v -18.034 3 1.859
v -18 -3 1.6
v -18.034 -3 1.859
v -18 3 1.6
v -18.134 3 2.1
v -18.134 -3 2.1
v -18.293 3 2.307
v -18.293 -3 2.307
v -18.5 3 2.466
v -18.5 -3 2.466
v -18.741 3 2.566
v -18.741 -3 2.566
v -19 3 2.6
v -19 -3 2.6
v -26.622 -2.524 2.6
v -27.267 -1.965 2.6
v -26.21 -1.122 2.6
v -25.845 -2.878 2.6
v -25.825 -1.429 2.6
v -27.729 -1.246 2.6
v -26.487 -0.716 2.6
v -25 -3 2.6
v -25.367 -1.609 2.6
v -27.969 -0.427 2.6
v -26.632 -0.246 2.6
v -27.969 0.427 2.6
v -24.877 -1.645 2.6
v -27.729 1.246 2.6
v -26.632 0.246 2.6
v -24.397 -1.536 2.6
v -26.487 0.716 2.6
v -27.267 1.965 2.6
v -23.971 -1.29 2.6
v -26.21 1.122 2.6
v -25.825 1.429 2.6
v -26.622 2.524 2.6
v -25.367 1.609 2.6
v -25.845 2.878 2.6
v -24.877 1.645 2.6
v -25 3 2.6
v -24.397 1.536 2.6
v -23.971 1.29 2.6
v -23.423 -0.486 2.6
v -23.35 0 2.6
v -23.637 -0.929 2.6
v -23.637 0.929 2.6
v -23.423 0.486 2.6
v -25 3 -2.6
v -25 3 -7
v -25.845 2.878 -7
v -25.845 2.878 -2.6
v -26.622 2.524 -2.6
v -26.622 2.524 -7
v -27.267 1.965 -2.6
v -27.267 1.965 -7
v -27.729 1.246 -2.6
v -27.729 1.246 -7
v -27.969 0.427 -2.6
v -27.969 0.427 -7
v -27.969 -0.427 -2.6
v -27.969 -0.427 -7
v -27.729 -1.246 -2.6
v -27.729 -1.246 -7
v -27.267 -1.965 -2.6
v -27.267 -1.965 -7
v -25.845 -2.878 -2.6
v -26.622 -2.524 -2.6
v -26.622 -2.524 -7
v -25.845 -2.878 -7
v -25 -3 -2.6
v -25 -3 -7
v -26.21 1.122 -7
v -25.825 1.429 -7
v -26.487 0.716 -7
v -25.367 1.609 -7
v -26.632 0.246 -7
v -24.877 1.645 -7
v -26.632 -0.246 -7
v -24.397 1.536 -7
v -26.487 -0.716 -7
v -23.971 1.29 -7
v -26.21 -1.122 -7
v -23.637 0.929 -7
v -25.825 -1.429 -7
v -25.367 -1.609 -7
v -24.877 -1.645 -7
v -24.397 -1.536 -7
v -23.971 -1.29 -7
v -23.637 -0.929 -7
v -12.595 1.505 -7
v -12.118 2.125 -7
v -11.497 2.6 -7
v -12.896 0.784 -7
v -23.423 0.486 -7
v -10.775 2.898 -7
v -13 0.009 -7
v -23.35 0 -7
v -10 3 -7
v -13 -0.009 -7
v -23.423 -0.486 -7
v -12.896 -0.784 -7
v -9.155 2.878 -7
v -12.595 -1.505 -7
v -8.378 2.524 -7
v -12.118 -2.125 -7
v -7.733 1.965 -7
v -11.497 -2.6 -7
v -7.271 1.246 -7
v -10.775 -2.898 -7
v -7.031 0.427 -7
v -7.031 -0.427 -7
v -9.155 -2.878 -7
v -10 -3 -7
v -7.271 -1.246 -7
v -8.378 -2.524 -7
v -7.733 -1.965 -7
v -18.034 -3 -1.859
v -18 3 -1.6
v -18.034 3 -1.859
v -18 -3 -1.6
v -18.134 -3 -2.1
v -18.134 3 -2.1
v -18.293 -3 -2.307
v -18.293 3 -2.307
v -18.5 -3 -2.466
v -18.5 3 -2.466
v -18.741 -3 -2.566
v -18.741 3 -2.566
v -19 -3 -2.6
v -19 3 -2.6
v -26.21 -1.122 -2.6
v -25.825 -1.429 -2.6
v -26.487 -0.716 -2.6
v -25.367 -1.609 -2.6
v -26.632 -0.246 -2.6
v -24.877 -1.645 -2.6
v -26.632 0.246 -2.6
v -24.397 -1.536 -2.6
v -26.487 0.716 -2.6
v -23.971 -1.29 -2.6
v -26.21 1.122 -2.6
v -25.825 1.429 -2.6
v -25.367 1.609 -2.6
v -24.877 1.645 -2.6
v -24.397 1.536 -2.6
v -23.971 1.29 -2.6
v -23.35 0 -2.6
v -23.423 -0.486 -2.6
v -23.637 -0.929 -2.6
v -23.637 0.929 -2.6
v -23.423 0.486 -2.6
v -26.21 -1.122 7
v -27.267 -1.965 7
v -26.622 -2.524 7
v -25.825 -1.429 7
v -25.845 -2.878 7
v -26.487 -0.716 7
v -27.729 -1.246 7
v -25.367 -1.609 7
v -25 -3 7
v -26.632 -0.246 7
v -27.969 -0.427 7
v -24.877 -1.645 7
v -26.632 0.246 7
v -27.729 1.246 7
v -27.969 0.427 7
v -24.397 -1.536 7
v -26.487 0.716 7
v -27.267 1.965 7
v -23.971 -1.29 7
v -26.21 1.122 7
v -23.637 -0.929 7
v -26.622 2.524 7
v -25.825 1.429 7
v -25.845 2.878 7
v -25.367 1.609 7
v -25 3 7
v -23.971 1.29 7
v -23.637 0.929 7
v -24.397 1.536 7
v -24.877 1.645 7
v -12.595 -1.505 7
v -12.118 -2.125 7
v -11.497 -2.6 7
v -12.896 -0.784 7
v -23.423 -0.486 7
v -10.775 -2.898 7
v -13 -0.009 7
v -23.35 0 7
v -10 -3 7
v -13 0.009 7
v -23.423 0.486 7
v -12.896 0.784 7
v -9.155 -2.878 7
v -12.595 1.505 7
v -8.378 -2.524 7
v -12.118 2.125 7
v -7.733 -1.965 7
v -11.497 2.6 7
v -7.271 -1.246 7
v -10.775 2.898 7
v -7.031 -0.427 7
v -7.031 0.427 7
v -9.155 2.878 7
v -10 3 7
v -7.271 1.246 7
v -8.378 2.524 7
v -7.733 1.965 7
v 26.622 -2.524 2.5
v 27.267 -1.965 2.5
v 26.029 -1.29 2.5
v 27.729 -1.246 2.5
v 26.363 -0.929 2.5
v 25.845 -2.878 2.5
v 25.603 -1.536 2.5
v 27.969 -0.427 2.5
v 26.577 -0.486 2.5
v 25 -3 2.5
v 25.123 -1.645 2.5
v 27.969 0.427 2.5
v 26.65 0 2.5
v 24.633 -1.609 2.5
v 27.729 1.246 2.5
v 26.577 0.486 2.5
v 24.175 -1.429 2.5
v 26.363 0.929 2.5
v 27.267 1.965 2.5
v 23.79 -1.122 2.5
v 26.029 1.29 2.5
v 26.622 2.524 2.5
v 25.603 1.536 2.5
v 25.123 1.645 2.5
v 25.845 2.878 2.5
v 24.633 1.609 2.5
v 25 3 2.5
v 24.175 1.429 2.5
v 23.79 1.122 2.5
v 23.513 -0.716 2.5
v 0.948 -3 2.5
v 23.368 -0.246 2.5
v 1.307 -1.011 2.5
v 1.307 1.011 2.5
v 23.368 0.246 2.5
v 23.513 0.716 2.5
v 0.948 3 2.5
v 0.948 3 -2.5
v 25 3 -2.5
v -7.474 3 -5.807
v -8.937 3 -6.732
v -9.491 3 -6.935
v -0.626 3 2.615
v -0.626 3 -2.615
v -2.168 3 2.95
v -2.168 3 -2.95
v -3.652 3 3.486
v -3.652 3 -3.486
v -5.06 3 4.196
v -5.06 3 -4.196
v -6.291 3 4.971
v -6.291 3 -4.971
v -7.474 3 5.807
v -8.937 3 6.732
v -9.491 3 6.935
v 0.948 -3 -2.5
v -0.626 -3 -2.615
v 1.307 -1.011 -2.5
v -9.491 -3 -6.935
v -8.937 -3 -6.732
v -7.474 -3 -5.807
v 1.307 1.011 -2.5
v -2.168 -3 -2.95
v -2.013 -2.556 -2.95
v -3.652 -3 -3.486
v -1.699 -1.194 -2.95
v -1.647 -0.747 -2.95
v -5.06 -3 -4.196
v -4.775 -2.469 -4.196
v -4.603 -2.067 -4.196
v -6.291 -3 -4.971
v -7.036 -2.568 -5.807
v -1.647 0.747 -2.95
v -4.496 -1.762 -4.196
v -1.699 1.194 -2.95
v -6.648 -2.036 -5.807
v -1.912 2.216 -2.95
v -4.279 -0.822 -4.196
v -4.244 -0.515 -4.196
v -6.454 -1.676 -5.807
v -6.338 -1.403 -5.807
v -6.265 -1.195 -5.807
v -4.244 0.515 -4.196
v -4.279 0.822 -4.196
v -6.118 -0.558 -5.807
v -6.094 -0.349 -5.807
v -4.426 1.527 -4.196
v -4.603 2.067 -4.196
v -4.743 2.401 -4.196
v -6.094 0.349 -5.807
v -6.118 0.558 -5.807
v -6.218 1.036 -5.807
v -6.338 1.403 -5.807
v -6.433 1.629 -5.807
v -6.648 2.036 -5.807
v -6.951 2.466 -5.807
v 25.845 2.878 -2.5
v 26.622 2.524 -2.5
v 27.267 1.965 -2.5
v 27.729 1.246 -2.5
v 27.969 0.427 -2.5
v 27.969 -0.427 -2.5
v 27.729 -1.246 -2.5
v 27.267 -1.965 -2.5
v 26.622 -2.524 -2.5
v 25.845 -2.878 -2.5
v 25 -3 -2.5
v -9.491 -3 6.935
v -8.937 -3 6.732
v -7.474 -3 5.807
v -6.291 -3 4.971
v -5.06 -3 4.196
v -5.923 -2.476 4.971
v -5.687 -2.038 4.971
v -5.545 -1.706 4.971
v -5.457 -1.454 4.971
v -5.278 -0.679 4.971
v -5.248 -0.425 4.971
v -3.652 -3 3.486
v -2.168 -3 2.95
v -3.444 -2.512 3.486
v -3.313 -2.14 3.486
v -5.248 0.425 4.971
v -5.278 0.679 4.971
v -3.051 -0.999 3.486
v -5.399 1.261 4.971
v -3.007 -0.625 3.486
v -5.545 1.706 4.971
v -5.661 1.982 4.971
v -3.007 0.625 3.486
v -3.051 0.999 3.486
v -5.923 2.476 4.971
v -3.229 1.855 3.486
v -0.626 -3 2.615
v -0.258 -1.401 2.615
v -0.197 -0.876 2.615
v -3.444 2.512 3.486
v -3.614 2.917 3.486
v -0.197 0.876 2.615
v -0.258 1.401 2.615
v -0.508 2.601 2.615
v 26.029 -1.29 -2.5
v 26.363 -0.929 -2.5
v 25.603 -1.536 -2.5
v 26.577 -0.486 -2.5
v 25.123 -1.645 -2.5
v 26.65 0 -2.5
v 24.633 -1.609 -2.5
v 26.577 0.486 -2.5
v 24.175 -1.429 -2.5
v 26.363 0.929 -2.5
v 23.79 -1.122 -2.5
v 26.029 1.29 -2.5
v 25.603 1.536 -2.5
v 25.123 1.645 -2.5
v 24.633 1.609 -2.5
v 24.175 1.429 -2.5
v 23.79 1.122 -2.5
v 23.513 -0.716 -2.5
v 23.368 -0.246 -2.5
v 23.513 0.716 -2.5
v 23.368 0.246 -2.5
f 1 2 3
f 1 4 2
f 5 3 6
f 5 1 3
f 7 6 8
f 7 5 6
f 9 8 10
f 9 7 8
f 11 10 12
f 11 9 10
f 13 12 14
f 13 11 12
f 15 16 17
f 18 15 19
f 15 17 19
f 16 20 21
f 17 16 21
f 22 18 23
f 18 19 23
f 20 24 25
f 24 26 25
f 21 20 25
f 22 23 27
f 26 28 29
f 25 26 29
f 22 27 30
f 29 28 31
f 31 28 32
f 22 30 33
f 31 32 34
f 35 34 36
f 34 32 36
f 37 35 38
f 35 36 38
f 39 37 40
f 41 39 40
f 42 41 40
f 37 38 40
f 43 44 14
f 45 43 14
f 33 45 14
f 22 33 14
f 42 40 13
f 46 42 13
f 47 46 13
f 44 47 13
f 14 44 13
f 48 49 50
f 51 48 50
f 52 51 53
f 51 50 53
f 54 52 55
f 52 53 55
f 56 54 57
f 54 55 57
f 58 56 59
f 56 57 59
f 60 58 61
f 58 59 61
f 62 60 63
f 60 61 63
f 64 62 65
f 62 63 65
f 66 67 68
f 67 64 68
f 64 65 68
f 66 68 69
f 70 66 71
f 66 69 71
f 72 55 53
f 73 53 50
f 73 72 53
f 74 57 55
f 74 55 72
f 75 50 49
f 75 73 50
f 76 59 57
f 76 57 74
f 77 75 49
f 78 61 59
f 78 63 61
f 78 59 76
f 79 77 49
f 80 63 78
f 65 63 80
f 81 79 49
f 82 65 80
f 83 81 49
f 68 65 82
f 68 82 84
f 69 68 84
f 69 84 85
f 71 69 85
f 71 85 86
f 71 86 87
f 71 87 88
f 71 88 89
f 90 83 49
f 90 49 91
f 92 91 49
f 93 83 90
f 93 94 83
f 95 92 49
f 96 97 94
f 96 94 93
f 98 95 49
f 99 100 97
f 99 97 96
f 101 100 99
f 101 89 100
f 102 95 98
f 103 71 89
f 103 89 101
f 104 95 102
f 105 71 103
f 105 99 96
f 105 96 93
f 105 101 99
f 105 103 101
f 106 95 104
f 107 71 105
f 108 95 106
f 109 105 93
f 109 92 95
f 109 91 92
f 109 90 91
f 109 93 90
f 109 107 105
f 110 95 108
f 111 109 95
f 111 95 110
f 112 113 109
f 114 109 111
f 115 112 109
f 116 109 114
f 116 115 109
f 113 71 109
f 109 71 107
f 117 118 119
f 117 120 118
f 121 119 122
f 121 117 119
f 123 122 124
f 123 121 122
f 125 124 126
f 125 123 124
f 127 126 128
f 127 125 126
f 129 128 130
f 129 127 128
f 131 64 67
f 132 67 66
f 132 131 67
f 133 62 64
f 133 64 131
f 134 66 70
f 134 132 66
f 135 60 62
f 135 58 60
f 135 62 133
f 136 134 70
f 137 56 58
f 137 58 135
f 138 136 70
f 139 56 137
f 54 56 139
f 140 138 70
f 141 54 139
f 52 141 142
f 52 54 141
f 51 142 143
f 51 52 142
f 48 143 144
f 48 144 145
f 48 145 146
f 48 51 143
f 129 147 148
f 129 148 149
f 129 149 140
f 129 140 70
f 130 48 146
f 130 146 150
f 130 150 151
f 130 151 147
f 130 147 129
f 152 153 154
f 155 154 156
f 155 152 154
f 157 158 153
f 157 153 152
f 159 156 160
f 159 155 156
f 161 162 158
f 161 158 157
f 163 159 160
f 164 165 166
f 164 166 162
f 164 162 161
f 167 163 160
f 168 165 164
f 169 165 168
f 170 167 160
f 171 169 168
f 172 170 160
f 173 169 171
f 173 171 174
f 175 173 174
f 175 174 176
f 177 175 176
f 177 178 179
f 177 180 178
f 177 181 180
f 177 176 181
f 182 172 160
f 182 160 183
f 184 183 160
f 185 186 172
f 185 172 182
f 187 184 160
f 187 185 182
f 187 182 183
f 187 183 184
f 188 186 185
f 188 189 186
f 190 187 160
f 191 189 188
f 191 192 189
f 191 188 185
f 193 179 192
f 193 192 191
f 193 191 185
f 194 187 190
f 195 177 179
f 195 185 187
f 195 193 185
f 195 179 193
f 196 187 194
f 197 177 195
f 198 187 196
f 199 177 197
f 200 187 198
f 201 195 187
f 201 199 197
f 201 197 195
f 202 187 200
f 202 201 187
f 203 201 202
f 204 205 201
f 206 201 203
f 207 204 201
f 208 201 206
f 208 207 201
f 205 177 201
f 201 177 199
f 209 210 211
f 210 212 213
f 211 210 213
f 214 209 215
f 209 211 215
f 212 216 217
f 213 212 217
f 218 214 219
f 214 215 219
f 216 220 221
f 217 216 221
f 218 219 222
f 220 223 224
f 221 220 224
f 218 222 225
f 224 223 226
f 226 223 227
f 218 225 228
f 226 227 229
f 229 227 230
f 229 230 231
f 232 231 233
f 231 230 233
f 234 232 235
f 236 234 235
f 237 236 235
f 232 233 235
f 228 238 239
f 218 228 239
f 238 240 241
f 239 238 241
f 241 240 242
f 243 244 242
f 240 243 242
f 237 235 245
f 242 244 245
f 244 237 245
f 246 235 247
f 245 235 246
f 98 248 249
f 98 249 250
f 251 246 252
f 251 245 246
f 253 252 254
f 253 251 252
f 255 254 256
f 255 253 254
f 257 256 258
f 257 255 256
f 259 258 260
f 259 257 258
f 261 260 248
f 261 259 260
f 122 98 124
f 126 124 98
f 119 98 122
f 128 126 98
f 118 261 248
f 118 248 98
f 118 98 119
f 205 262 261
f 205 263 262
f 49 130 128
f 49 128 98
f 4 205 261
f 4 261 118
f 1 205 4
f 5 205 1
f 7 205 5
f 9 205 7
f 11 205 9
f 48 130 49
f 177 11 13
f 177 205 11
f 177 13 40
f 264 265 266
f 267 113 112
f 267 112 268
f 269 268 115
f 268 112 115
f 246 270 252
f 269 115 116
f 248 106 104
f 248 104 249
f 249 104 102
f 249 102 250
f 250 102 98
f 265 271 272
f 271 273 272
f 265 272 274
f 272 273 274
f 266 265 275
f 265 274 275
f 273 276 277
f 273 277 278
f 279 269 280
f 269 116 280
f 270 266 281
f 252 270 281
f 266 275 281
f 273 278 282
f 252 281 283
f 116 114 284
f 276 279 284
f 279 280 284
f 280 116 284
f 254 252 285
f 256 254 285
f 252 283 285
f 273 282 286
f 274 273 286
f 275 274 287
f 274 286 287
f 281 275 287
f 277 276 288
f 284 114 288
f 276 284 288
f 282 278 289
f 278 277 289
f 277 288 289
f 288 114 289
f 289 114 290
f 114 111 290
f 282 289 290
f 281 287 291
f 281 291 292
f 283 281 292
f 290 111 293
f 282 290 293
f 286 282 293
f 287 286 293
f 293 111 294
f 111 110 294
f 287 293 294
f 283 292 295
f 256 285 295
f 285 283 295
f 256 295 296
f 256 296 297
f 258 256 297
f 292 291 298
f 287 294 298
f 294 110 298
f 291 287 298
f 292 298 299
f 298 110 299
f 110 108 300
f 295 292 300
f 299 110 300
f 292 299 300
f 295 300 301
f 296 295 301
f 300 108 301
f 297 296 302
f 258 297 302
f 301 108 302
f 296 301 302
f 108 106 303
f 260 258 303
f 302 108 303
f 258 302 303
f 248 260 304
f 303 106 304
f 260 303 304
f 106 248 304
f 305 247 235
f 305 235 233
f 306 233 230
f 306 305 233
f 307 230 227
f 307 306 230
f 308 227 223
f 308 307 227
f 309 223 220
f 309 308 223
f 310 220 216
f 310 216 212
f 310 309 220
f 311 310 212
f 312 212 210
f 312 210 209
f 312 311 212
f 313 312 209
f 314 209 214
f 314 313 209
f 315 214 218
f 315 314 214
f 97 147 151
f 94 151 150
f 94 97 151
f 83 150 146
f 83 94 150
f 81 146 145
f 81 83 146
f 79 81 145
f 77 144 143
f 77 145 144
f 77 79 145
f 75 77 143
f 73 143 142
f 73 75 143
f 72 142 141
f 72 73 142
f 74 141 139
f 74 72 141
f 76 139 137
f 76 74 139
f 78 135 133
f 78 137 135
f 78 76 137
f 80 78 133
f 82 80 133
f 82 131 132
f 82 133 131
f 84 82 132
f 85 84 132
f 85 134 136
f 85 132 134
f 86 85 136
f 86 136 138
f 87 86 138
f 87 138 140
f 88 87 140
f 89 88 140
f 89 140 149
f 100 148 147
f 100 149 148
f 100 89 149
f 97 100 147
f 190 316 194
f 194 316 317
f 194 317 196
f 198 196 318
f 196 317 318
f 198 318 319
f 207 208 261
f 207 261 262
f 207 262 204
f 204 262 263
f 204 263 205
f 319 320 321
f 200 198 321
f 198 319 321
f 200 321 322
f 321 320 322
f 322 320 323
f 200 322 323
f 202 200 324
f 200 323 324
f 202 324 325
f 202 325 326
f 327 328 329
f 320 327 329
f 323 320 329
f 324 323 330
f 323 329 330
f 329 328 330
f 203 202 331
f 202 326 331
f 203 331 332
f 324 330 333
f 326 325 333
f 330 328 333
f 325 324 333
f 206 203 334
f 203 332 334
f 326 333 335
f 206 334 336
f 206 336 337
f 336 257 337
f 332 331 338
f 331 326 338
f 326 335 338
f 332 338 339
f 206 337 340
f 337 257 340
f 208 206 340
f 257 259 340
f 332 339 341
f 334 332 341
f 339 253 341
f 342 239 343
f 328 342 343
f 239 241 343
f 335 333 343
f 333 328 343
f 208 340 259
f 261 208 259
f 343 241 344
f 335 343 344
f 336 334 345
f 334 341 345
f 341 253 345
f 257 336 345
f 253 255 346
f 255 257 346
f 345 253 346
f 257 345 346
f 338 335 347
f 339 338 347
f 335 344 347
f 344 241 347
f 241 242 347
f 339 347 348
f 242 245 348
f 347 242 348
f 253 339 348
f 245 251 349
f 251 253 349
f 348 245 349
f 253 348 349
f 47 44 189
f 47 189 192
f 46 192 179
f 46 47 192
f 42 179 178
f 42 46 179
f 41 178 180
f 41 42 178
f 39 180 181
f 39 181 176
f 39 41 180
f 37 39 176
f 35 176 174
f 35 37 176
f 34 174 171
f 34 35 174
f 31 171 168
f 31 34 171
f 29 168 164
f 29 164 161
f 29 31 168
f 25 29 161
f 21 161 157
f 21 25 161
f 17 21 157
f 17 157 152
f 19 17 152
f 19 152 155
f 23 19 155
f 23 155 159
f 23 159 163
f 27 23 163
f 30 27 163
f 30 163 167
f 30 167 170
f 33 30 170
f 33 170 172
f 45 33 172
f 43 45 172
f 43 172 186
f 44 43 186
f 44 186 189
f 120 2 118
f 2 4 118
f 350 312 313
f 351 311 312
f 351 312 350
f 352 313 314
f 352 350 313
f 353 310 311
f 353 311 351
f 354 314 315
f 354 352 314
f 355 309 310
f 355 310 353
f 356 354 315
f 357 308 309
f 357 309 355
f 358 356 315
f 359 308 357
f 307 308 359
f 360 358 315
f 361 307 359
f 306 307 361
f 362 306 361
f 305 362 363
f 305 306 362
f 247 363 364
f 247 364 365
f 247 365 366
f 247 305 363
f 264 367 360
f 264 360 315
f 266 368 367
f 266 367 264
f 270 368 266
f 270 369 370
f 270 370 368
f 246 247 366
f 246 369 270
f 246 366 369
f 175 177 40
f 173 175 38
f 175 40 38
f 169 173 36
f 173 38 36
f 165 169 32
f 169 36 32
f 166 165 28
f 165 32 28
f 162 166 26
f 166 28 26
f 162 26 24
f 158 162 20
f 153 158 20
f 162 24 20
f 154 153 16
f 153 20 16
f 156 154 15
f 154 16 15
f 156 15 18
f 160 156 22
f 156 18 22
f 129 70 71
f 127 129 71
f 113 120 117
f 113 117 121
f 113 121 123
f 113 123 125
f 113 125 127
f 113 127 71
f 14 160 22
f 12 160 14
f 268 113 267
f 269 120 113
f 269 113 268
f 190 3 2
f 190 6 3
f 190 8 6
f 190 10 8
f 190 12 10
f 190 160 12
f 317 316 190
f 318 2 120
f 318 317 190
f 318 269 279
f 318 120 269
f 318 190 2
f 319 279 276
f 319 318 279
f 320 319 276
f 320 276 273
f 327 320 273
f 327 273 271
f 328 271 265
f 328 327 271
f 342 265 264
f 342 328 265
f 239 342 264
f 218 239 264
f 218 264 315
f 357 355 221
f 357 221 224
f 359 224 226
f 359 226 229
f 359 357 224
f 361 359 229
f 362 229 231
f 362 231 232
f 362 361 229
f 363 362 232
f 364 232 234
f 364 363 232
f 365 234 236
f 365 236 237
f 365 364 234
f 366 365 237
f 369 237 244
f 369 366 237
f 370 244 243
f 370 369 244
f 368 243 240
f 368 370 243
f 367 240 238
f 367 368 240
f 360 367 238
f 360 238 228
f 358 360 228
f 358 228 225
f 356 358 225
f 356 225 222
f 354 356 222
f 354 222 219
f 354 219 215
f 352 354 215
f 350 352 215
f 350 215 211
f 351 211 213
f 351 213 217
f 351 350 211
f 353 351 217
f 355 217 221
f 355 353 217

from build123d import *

# Parameters (mm, degrees)
EXTRUDE_1_DEPTH      = 2.5
EXTRUDE_1_DEPTH_BACK = 2.5
SKETCH_1_R           = 1.65
EXTRUDE_2_DEPTH      = 4.5
EXTRUDE_2_DEPTH_BACK = 9.5
SKETCH_2_R           = 1.65
EXTRUDE_3_REACH      = 33.448
SKETCH_4_W           = 20
SKETCH_4_H           = 5.2
CUT_EXTRUDE_1_DEPTH  = 13.5
FILLET_1_R           = 10
FILLET_2_R           = 1


with BuildPart() as part:
    # 草图1 → 凸台-拉伸1 (new, two sides: drawn at the far end of the back side and taken through both)
    with BuildSketch(Plane.XY.offset(-EXTRUDE_1_DEPTH_BACK)):
        with BuildLine():
            Line((-25, 3), (25, 3))
            ThreePointArc((25, 3), (28, 0), (25, -3))
            Line((25, -3), (-25, -3))
            ThreePointArc((-25, -3), (-28, 0), (-25, 3))
        make_face()
        with Locations((-25, 0)):
            Circle(SKETCH_1_R, mode=Mode.SUBTRACT)
        with Locations((25, 0)):
            Circle(SKETCH_1_R, mode=Mode.SUBTRACT)
    extrude(amount=EXTRUDE_1_DEPTH + EXTRUDE_1_DEPTH_BACK)

    # 草图2 → 凸台-拉伸2 (add, two sides: drawn at the far end of the back side and taken through both)
    with BuildSketch(Plane.XY.offset(2.5).offset(-EXTRUDE_2_DEPTH_BACK)):
        with BuildLine():
            ThreePointArc((-25, -3), (-22.878679656, -2.121320344), (-22, 0))
            ThreePointArc((-22, 0), (-22.878679656, 2.121320344), (-25, 3))
            ThreePointArc((-25, 3), (-28, 0), (-25, -3))
        make_face()
        with Locations((-25, 0)):
            Circle(SKETCH_2_R, mode=Mode.SUBTRACT)
    extrude(amount=EXTRUDE_2_DEPTH + EXTRUDE_2_DEPTH_BACK)

    # 凸台-拉伸3: up to this face of the body (flat: up to its plane)
    extrude_3_end = Plane(part.part.faces().sort_by_distance((-25, 2.915147186, -7))[0])
    # 草图3 → 凸台-拉伸3 (add, up to the picked face)
    with BuildSketch(Plane.XY.offset(7), mode=Mode.PRIVATE) as extrude_3_sk1:
        with BuildLine():
            Line((-25, -3), (-10, -3))
            ThreePointArc((-10, -3), (-7, 0), (-10, 3))
            Line((-10, 3), (-25, 3))
            ThreePointArc((-25, 3), (-22, 0), (-25, -3))
        make_face()
    extrude_3_tool1 = split(extrude(extrude_3_sk1.sketch, amount=-EXTRUDE_3_REACH, mode=Mode.PRIVATE), bisect_by=extrude_3_end, keep=Keep.BOTH, mode=Mode.PRIVATE)
    add(extrude_3_tool1.solids().sort_by(Axis((-15.143806, 0, 7), (0, 0, -1)))[0])

    # 草图4 → 切除-拉伸1 (cut)
    with BuildSketch(Plane(origin=(0, 3, 0), x_dir=(1, 0, 0), z_dir=(0, 1, 0))):
        with Locations((-28, 0)):
            Rectangle(SKETCH_4_W, SKETCH_4_H)
    extrude(amount=-CUT_EXTRUDE_1_DEPTH, mode=Mode.SUBTRACT)

    # 圆角1
    # the kernel refuses this fillet: 10 mm, written as the material it adds along each edge
    with BuildSketch(Plane(origin=(-10, 0, -2.5), x_dir=(-0.9999950652018582, -0.0031415874858792066, 0), z_dir=(-0.0031415874858792066, 0.9999950652018582, 0))) as fillet_1_piece_1_section:
        with BuildLine():
            CenterArc((11.351646544, -10), FILLET_1_R, 90, 56.632987031)
            Line((11.351646544, 0), (3, 0))
            Line((3, 0), (3, -4.5))
        make_face()
    fillet_1_piece_1 = revolve(axis=Axis((-10, 0, -2.5), (0, 0, 1)), revolution_arc=359.64, mode=Mode.PRIVATE)
    fillet_1_piece_1 = split(fillet_1_piece_1, bisect_by=Plane(origin=(-4.0130996, 3, -4.037145942), z_dir=(0, -1, 0)), keep=Keep.TOP, mode=Mode.PRIVATE)
    fillet_1_piece_1 = split(fillet_1_piece_1, bisect_by=Plane(origin=(-18, 1e-09, -4.037145942), z_dir=(1, 0, 0)), keep=Keep.TOP, mode=Mode.PRIVATE)
    fillet_1_piece_1 = split(fillet_1_piece_1, bisect_by=Plane(origin=(-4.0130996, -3, -4.037145942), z_dir=(0, 1, 0)), keep=Keep.TOP, mode=Mode.PRIVATE)
    add(fillet_1_piece_1)
    with BuildSketch(Plane(origin=(-10, 0, 2.5), x_dir=(-0.9999950652018582, -0.0031415874858792066, 0), z_dir=(-0.0031415874858792066, 0.9999950652018582, 0))) as fillet_1_piece_2_section:
        with BuildLine():
            CenterArc((11.351646544, 10), FILLET_1_R, 213.367012969, 56.632987031)
            Line((3, 4.5), (3, 0))
            Line((3, 0), (11.351646544, 0))
        make_face()
    fillet_1_piece_2 = revolve(axis=Axis((-10, 0, 2.5), (0, 0, 1)), revolution_arc=359.64, mode=Mode.PRIVATE)
    fillet_1_piece_2 = split(fillet_1_piece_2, bisect_by=Plane(origin=(0.64312555, 3, 2.505081391), z_dir=(0, -1, 0)), keep=Keep.TOP, mode=Mode.PRIVATE)
    fillet_1_piece_2 = split(fillet_1_piece_2, bisect_by=Plane(origin=(-18, 0, 2.505081391), z_dir=(1, 0, 0)), keep=Keep.TOP, mode=Mode.PRIVATE)
    fillet_1_piece_2 = split(fillet_1_piece_2, bisect_by=Plane(origin=(0.64312555, -3, 2.505081391), z_dir=(0, 1, 0)), keep=Keep.TOP, mode=Mode.PRIVATE)
    add(fillet_1_piece_2)

    # 圆角2
    fillet_2_edges = [part.edges().sort_by_distance(p)[0] for p in [
        (-18, 0, 2.6),
        (-18, 0, -2.6),
    ]]
    fillet(fillet_2_edges, radius=FILLET_2_R)


solid = part.part
